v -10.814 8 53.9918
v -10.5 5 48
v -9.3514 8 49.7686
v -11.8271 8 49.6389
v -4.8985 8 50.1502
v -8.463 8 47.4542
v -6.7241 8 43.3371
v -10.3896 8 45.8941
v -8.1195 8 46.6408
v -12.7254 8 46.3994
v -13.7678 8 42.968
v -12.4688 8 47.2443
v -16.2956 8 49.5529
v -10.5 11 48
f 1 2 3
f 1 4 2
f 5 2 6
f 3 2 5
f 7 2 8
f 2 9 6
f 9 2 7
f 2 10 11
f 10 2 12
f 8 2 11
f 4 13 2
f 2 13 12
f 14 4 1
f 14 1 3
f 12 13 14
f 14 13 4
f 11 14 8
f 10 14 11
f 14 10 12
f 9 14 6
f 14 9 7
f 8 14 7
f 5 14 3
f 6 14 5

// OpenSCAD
module star(numberOfPoints, pointLength, width, height) {
    difference() {
        union() {
            for (i=[1:numberOfPoints]) {
                rotate([0, 0, 360/numberOfPoints*i])
                rotate([0,90,0])
                //scale([1,1,1])
                cylinder(h=pointLength, r1=width*1.5, r2=0, $fn=3);
            }
        }
        translate([0,0,width/2])
        cube(center=true, [pointLength*2+5, pointLength*2+5, width]);
    }
}

translate([-10.5,8,48]) {
rotate([90,-15,180])
scale(0.4)
star(5, 15, 5, 2);


rotate([90,-21,0])
scale(0.4)
star(5, 15, 5, 2);
}
